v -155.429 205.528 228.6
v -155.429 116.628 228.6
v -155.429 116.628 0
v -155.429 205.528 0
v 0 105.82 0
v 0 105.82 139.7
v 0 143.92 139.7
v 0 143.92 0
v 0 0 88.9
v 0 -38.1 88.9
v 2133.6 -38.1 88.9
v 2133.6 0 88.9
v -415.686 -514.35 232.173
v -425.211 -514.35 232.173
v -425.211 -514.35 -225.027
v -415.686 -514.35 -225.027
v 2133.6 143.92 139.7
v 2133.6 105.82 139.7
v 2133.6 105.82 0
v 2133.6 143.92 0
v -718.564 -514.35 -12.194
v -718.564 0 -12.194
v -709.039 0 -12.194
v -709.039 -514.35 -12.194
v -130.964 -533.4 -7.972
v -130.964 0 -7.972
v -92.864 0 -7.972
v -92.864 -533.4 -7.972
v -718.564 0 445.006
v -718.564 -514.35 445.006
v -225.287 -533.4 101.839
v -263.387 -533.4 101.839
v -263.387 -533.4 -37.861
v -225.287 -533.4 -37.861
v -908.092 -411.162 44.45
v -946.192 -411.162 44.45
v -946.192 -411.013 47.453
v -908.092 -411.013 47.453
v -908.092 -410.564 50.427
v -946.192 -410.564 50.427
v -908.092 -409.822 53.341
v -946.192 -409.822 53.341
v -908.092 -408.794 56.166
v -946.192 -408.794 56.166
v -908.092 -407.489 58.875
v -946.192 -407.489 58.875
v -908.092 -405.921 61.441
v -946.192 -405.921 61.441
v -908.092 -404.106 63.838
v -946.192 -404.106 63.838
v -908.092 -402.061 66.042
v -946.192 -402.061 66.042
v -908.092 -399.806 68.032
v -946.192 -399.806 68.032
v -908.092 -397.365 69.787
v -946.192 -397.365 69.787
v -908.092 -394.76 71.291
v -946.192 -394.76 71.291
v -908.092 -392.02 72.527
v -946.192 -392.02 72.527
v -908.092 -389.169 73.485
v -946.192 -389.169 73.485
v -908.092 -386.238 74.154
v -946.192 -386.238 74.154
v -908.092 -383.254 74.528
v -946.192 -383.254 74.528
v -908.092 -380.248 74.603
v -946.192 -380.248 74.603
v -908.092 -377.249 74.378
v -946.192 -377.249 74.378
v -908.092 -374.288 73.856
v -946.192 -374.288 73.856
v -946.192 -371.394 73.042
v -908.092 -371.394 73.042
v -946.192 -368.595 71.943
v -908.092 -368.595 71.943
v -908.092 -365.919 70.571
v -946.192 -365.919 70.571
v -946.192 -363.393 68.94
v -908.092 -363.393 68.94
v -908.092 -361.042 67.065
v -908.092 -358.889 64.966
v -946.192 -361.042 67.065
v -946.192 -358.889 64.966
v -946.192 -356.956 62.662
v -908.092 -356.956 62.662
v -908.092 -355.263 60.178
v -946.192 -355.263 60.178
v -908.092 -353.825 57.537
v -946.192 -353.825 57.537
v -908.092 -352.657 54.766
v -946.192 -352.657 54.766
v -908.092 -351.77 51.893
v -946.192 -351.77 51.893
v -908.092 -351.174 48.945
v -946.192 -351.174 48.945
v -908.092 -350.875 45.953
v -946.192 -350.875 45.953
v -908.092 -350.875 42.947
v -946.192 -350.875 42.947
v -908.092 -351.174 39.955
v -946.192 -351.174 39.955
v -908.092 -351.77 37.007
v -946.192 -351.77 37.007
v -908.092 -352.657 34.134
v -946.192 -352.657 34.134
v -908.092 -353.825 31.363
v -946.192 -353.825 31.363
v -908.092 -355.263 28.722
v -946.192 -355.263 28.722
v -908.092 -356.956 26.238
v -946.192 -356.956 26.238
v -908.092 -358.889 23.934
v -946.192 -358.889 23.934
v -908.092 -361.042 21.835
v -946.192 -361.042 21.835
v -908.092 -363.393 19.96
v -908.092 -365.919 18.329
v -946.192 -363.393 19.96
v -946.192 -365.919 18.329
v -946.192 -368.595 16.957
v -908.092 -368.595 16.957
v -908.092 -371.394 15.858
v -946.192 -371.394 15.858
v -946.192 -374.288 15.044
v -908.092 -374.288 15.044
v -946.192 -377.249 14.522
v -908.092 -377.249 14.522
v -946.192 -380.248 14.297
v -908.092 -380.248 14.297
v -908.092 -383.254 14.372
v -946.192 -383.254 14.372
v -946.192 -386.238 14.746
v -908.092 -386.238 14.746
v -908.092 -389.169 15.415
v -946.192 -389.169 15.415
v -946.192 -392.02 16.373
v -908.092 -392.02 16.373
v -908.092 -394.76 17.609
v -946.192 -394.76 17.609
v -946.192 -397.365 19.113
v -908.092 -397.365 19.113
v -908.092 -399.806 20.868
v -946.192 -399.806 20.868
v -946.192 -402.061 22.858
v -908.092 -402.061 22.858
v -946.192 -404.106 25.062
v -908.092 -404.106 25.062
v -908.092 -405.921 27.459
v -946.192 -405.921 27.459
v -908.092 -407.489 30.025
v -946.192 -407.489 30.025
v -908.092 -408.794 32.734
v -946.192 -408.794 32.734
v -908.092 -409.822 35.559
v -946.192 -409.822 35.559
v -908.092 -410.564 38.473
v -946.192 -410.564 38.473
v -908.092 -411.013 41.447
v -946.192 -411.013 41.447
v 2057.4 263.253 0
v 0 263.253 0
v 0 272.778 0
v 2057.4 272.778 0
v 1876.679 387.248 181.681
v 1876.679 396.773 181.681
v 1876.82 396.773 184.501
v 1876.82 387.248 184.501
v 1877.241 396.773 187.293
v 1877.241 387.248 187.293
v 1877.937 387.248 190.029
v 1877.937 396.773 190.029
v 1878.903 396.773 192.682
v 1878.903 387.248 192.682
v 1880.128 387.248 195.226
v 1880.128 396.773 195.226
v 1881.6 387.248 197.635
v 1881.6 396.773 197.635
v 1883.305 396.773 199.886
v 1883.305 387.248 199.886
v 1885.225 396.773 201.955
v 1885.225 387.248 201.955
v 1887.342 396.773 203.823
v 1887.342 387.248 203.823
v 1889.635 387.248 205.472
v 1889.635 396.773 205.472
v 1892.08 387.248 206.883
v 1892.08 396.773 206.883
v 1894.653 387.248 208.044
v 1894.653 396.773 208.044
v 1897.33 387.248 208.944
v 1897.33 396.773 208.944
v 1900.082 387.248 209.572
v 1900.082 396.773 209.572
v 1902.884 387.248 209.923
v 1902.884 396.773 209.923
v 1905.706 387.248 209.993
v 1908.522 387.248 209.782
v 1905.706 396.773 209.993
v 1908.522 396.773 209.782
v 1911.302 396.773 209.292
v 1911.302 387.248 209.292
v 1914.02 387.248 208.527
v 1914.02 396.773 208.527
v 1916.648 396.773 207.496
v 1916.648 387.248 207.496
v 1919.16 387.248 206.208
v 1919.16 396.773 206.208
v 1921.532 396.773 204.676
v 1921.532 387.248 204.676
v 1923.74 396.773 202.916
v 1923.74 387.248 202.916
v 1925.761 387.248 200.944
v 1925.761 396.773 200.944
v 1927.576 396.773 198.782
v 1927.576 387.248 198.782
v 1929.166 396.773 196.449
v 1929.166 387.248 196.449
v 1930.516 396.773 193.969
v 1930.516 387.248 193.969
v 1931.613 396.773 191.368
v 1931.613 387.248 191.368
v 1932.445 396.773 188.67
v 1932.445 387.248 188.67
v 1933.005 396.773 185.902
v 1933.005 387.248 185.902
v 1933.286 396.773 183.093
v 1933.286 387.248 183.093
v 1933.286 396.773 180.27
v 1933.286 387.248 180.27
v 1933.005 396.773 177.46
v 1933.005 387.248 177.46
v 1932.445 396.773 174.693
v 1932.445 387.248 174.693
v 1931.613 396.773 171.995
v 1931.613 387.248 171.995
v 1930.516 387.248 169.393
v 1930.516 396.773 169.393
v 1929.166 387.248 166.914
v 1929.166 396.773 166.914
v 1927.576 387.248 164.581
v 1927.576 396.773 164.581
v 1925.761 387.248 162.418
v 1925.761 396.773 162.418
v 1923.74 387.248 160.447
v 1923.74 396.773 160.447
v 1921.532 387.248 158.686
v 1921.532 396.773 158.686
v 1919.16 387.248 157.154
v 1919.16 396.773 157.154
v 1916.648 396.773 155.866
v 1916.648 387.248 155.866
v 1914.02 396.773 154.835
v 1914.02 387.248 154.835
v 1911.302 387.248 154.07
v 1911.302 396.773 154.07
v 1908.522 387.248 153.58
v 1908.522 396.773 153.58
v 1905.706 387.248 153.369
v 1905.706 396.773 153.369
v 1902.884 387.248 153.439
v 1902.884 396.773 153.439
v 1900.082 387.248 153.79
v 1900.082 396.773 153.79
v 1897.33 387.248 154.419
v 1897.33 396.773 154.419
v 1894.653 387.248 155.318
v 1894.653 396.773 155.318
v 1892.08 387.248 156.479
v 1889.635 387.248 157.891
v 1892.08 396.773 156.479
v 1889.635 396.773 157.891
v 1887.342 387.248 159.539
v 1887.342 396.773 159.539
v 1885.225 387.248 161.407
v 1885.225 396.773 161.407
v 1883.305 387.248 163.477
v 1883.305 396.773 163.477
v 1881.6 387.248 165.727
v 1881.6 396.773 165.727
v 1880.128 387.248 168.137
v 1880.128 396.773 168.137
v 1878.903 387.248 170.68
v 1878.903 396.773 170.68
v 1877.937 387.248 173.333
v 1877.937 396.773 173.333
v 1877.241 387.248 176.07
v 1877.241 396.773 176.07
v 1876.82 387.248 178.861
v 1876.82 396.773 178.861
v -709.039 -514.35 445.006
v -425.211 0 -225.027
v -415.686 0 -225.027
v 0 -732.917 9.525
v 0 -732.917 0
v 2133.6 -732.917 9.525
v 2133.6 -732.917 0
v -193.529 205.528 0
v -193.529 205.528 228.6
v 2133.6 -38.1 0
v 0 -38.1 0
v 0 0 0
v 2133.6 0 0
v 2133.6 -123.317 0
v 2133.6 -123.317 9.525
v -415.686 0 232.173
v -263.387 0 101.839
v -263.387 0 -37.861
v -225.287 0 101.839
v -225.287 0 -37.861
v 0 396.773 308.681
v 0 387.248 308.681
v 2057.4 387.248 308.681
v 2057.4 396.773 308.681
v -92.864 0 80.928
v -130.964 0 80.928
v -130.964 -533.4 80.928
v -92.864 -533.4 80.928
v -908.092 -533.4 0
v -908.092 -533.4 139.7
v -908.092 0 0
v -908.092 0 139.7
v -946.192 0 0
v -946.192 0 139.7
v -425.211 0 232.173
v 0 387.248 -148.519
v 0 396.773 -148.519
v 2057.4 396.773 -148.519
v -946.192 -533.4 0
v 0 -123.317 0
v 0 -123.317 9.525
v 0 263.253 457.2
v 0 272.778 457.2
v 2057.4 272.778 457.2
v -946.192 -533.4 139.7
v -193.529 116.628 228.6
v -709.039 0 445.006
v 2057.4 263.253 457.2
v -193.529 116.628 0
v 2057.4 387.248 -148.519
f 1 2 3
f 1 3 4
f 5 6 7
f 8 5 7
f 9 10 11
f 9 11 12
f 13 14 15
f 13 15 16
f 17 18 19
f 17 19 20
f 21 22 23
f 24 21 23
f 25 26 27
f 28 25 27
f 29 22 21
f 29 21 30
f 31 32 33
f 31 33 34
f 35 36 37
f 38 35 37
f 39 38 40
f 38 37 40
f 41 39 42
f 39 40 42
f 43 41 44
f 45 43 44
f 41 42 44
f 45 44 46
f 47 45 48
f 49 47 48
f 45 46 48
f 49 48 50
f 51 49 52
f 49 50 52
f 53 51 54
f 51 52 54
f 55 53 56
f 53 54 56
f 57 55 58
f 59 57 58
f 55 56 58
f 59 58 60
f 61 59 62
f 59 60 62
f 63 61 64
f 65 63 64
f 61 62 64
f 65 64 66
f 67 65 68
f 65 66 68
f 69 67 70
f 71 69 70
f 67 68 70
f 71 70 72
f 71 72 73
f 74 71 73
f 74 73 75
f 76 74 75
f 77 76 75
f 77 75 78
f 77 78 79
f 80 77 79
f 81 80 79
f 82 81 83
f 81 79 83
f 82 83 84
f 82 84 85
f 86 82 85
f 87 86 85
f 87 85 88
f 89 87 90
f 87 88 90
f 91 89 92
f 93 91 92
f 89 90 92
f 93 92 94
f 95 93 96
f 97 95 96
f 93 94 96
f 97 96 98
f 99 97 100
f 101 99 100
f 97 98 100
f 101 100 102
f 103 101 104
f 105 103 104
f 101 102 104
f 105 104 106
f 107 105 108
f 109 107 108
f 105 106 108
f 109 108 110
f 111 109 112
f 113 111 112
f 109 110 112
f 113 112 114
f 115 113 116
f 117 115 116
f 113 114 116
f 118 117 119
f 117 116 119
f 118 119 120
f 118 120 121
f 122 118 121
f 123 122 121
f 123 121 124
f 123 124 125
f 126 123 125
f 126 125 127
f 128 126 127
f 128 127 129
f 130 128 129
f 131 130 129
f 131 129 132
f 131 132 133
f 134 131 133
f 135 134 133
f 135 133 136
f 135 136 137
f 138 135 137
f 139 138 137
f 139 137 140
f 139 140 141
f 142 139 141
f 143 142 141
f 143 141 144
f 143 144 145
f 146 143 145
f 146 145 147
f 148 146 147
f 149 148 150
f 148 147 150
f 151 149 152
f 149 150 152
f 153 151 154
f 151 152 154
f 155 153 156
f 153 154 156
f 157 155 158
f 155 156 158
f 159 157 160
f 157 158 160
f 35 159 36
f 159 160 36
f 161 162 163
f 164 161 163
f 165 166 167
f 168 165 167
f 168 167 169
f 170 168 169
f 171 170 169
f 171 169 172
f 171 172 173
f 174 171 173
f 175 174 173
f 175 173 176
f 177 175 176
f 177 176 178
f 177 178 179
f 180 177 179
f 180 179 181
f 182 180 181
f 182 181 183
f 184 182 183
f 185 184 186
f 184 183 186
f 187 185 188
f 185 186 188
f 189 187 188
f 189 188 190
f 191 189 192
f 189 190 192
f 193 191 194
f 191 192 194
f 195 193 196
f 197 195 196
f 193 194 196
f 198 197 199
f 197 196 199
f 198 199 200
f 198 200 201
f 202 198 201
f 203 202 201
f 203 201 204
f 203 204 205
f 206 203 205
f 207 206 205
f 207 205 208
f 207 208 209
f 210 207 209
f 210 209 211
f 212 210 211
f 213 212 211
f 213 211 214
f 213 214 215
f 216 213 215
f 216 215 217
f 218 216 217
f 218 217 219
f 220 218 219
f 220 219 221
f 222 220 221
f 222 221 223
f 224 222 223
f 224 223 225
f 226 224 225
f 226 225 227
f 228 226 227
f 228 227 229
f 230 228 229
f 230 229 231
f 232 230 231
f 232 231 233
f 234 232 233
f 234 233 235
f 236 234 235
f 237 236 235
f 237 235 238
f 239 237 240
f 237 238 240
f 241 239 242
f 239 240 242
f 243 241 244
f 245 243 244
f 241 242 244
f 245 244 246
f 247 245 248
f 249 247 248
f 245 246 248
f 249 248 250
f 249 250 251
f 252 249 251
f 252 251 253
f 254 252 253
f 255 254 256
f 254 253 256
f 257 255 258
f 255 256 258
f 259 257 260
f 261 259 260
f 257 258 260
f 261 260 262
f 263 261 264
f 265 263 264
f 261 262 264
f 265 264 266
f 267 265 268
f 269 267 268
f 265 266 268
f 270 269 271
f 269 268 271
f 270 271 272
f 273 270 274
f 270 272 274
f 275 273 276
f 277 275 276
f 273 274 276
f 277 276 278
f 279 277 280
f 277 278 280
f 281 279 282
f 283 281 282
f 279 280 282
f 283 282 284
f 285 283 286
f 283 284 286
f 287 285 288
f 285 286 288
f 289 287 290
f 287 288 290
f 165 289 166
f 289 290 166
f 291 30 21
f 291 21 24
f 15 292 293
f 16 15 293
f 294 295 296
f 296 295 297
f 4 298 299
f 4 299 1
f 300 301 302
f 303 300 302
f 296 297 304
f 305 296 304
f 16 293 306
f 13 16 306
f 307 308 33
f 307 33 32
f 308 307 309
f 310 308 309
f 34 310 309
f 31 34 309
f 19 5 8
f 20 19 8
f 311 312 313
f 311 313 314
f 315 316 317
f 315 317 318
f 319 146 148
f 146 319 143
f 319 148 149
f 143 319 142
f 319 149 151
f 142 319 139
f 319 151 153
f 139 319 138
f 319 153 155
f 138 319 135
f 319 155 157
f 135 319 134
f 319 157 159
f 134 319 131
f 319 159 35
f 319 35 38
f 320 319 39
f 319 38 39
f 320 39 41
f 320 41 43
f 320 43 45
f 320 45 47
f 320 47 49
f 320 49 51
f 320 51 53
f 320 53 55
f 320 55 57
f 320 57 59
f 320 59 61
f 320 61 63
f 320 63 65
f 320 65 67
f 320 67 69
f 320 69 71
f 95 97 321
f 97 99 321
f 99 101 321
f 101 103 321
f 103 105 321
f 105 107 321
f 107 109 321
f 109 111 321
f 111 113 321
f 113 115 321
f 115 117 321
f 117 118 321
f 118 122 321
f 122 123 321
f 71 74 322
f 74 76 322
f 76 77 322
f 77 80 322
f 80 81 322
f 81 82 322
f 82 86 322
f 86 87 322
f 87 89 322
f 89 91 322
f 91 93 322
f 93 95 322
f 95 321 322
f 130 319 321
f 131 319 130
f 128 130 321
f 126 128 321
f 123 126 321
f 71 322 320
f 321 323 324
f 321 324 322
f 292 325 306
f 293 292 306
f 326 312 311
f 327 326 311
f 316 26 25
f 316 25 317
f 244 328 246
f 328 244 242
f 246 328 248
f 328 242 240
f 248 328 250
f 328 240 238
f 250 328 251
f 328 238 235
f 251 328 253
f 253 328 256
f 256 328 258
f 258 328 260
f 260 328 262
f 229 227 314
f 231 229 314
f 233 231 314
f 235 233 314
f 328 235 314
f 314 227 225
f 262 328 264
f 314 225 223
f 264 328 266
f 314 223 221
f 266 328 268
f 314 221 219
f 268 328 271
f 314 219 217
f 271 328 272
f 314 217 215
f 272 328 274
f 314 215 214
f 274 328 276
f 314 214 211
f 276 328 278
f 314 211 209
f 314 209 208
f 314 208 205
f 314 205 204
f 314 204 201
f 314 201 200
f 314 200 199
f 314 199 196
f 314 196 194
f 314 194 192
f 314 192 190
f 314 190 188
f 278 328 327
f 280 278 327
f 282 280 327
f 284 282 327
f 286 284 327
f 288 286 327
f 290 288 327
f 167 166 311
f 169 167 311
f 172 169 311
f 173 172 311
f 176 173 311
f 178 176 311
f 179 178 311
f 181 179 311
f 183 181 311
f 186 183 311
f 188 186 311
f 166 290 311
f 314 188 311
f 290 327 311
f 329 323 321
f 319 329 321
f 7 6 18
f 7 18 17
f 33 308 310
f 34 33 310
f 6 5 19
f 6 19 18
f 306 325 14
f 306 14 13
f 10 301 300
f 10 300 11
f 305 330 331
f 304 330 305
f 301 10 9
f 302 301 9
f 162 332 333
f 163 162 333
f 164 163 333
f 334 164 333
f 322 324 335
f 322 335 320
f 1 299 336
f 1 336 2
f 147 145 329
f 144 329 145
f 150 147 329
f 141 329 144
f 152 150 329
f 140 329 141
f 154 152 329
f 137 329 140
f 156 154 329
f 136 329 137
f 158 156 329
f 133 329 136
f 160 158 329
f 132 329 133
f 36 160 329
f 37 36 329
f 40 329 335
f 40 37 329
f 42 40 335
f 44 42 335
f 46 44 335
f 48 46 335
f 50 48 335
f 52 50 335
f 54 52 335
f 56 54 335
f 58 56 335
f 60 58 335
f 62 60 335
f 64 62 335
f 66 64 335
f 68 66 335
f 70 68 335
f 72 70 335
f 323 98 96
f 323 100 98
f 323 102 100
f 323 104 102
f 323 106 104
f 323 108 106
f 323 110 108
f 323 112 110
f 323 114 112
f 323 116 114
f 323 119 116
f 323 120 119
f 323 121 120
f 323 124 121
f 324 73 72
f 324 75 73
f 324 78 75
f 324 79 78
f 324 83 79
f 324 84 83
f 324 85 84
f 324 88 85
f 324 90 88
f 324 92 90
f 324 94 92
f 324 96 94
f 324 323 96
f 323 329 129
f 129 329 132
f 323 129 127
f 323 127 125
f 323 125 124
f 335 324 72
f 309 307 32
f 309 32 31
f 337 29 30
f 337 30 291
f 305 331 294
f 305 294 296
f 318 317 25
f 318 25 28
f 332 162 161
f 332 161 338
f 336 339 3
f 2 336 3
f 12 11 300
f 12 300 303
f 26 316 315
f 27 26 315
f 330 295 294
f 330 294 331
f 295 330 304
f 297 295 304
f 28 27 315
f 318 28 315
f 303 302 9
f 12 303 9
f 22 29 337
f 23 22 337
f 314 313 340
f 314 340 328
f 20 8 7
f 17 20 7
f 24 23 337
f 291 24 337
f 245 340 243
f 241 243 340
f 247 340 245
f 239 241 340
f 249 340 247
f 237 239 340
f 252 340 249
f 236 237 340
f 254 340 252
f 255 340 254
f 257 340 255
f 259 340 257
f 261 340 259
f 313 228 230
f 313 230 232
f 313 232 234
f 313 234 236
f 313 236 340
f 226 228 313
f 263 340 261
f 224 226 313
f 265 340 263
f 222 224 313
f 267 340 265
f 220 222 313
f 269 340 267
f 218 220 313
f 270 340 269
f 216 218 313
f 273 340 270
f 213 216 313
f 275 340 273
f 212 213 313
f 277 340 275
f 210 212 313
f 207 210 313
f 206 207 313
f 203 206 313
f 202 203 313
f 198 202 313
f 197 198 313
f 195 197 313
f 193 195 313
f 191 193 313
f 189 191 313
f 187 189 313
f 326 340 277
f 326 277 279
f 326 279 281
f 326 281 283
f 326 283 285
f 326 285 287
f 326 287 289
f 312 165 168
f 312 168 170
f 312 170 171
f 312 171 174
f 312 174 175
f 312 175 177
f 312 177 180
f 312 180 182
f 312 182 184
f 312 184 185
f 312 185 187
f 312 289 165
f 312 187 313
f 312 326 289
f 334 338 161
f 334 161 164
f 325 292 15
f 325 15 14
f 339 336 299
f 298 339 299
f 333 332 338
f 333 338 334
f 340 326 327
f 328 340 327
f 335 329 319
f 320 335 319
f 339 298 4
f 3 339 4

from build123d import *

# Parameters (mm, degrees)
F0_W      = 38.1
F0_H      = 88.9
F1_DEPTH  = 2133.6
F2_W      = 38.1
F2_H      = 88.9
F3_DEPTH  = 533.4
F4_W      = 38.1
F4_H      = 139.7
F5_DEPTH  = 2133.6
F6_W      = 38.1
F6_H      = 139.7
F7_DEPTH  = 533.4
F8_W      = 38.1
F8_H      = 88.9
F9_DEPTH  = 228.6
F10_W     = 2133.6
F10_H     = 609.6
F11_DEPTH = 9.525
F12_W     = 9.525
F12_H     = 457.2
F13_DEPTH = 2057.4
F14_W     = 9.525
F14_H     = 457.2
F15_DEPTH = 2057.4
F16_W     = 9.525
F16_H     = 457.2
F17_DEPTH = 514.35
F18_W     = 9.525
F18_H     = 457.2
F19_DEPTH = 514.35
F20_R     = 28.321
F21_DEPTH = 25.4
F22_W     = 38.1
F22_H     = 139.7
F23_DEPTH = 533.4
F24_R     = 30.1625
F25_DEPTH = 38.1


with BuildPart() as f1:
    # F0 (on Right) → F1 (new body)
    with BuildSketch(Plane.YZ):
        with Locations((-19.05, 44.45)):
            Rectangle(F0_W, F0_H)
    extrude(amount=F1_DEPTH)


with BuildPart() as f3:
    # F2 (on Front) → F3 (new body)
    with BuildSketch(Plane.XZ):
        with Locations((-111.913837, 36.477584)):
            Rectangle(F2_W, F2_H)
    extrude(amount=F3_DEPTH)


with BuildPart() as f5:
    # F4 (on Right) → F5 (new body)
    with BuildSketch(Plane.YZ):
        with Locations((124.870102, 69.85)):
            Rectangle(F4_W, F4_H)
    extrude(amount=F5_DEPTH)


with BuildPart() as f7:
    # F6 (on Front) → F7 (new body)
    with BuildSketch(Plane.XZ):
        with Locations((-244.33665, 31.989101)):
            Rectangle(F6_W, F6_H)
    extrude(amount=F7_DEPTH)


with BuildPart() as f9:
    # F8 (on Top) → F9 (new body)
    with BuildSketch(Plane.XY):
        with Locations((-174.478993, 161.077559)):
            Rectangle(F8_W, F8_H)
    extrude(amount=F9_DEPTH)


with BuildPart() as f11:
    # F10 (on Top) → F11 (new body)
    with BuildSketch(Plane.XY):
        with Locations((1066.8, -428.116654)):
            Rectangle(F10_W, F10_H)
    extrude(amount=F11_DEPTH)


with BuildPart() as f13:
    # F12 (on Right) → F13 (new body)
    with BuildSketch(Plane.YZ):
        with Locations((268.015032, 228.6)):
            Rectangle(F12_W, F12_H)
    extrude(amount=F13_DEPTH)


with BuildPart() as f15:
    # F14 (on Right) → F15 (new body)
    with BuildSketch(Plane.YZ):
        with Locations((392.010808, 80.081202)):
            Rectangle(F14_W, F14_H)
    extrude(amount=F15_DEPTH)

    # F20 (on face) → F21 (cut)
    with BuildSketch(Plane(origin=(0, 396.773308, 0), x_dir=(-1, 0, 0), z_dir=(0, 1, 0))):
        with Locations((-1905, 181.681202)):
            Circle(F20_R)
    extrude(amount=-F21_DEPTH, mode=Mode.SUBTRACT)


with BuildPart() as f17:
    # F16 (on Front) → F17 (new body)
    with BuildSketch(Plane.XZ):
        with Locations((-420.448571, 3.57252)):
            Rectangle(F16_W, F16_H)
    extrude(amount=F17_DEPTH)


with BuildPart() as f19:
    # F18 (on Front) → F19 (new body)
    with BuildSketch(Plane.XZ):
        with Locations((-713.801622, 216.40639)):
            Rectangle(F18_W, F18_H)
    extrude(amount=F19_DEPTH)


with BuildPart() as f23:
    # F22 (on Front) → F23 (new body)
    with BuildSketch(Plane.XZ):
        with Locations((-927.142379, 69.85)):
            Rectangle(F22_W, F22_H)
    extrude(amount=F23_DEPTH)

    # F24 (on face) → F25 (cut)
    with BuildSketch(Plane(origin=(-946.192379, 0, 0), x_dir=(0, -1, 0), z_dir=(-1, 0, 0))):
        with Locations((381, 44.45)):
            Circle(F24_R)
    extrude(amount=-F25_DEPTH, mode=Mode.SUBTRACT)


solid = Compound([f1.part, f3.part, f5.part, f7.part, f9.part, f11.part, f13.part, f15.part, f17.part, f19.part, f23.part])
